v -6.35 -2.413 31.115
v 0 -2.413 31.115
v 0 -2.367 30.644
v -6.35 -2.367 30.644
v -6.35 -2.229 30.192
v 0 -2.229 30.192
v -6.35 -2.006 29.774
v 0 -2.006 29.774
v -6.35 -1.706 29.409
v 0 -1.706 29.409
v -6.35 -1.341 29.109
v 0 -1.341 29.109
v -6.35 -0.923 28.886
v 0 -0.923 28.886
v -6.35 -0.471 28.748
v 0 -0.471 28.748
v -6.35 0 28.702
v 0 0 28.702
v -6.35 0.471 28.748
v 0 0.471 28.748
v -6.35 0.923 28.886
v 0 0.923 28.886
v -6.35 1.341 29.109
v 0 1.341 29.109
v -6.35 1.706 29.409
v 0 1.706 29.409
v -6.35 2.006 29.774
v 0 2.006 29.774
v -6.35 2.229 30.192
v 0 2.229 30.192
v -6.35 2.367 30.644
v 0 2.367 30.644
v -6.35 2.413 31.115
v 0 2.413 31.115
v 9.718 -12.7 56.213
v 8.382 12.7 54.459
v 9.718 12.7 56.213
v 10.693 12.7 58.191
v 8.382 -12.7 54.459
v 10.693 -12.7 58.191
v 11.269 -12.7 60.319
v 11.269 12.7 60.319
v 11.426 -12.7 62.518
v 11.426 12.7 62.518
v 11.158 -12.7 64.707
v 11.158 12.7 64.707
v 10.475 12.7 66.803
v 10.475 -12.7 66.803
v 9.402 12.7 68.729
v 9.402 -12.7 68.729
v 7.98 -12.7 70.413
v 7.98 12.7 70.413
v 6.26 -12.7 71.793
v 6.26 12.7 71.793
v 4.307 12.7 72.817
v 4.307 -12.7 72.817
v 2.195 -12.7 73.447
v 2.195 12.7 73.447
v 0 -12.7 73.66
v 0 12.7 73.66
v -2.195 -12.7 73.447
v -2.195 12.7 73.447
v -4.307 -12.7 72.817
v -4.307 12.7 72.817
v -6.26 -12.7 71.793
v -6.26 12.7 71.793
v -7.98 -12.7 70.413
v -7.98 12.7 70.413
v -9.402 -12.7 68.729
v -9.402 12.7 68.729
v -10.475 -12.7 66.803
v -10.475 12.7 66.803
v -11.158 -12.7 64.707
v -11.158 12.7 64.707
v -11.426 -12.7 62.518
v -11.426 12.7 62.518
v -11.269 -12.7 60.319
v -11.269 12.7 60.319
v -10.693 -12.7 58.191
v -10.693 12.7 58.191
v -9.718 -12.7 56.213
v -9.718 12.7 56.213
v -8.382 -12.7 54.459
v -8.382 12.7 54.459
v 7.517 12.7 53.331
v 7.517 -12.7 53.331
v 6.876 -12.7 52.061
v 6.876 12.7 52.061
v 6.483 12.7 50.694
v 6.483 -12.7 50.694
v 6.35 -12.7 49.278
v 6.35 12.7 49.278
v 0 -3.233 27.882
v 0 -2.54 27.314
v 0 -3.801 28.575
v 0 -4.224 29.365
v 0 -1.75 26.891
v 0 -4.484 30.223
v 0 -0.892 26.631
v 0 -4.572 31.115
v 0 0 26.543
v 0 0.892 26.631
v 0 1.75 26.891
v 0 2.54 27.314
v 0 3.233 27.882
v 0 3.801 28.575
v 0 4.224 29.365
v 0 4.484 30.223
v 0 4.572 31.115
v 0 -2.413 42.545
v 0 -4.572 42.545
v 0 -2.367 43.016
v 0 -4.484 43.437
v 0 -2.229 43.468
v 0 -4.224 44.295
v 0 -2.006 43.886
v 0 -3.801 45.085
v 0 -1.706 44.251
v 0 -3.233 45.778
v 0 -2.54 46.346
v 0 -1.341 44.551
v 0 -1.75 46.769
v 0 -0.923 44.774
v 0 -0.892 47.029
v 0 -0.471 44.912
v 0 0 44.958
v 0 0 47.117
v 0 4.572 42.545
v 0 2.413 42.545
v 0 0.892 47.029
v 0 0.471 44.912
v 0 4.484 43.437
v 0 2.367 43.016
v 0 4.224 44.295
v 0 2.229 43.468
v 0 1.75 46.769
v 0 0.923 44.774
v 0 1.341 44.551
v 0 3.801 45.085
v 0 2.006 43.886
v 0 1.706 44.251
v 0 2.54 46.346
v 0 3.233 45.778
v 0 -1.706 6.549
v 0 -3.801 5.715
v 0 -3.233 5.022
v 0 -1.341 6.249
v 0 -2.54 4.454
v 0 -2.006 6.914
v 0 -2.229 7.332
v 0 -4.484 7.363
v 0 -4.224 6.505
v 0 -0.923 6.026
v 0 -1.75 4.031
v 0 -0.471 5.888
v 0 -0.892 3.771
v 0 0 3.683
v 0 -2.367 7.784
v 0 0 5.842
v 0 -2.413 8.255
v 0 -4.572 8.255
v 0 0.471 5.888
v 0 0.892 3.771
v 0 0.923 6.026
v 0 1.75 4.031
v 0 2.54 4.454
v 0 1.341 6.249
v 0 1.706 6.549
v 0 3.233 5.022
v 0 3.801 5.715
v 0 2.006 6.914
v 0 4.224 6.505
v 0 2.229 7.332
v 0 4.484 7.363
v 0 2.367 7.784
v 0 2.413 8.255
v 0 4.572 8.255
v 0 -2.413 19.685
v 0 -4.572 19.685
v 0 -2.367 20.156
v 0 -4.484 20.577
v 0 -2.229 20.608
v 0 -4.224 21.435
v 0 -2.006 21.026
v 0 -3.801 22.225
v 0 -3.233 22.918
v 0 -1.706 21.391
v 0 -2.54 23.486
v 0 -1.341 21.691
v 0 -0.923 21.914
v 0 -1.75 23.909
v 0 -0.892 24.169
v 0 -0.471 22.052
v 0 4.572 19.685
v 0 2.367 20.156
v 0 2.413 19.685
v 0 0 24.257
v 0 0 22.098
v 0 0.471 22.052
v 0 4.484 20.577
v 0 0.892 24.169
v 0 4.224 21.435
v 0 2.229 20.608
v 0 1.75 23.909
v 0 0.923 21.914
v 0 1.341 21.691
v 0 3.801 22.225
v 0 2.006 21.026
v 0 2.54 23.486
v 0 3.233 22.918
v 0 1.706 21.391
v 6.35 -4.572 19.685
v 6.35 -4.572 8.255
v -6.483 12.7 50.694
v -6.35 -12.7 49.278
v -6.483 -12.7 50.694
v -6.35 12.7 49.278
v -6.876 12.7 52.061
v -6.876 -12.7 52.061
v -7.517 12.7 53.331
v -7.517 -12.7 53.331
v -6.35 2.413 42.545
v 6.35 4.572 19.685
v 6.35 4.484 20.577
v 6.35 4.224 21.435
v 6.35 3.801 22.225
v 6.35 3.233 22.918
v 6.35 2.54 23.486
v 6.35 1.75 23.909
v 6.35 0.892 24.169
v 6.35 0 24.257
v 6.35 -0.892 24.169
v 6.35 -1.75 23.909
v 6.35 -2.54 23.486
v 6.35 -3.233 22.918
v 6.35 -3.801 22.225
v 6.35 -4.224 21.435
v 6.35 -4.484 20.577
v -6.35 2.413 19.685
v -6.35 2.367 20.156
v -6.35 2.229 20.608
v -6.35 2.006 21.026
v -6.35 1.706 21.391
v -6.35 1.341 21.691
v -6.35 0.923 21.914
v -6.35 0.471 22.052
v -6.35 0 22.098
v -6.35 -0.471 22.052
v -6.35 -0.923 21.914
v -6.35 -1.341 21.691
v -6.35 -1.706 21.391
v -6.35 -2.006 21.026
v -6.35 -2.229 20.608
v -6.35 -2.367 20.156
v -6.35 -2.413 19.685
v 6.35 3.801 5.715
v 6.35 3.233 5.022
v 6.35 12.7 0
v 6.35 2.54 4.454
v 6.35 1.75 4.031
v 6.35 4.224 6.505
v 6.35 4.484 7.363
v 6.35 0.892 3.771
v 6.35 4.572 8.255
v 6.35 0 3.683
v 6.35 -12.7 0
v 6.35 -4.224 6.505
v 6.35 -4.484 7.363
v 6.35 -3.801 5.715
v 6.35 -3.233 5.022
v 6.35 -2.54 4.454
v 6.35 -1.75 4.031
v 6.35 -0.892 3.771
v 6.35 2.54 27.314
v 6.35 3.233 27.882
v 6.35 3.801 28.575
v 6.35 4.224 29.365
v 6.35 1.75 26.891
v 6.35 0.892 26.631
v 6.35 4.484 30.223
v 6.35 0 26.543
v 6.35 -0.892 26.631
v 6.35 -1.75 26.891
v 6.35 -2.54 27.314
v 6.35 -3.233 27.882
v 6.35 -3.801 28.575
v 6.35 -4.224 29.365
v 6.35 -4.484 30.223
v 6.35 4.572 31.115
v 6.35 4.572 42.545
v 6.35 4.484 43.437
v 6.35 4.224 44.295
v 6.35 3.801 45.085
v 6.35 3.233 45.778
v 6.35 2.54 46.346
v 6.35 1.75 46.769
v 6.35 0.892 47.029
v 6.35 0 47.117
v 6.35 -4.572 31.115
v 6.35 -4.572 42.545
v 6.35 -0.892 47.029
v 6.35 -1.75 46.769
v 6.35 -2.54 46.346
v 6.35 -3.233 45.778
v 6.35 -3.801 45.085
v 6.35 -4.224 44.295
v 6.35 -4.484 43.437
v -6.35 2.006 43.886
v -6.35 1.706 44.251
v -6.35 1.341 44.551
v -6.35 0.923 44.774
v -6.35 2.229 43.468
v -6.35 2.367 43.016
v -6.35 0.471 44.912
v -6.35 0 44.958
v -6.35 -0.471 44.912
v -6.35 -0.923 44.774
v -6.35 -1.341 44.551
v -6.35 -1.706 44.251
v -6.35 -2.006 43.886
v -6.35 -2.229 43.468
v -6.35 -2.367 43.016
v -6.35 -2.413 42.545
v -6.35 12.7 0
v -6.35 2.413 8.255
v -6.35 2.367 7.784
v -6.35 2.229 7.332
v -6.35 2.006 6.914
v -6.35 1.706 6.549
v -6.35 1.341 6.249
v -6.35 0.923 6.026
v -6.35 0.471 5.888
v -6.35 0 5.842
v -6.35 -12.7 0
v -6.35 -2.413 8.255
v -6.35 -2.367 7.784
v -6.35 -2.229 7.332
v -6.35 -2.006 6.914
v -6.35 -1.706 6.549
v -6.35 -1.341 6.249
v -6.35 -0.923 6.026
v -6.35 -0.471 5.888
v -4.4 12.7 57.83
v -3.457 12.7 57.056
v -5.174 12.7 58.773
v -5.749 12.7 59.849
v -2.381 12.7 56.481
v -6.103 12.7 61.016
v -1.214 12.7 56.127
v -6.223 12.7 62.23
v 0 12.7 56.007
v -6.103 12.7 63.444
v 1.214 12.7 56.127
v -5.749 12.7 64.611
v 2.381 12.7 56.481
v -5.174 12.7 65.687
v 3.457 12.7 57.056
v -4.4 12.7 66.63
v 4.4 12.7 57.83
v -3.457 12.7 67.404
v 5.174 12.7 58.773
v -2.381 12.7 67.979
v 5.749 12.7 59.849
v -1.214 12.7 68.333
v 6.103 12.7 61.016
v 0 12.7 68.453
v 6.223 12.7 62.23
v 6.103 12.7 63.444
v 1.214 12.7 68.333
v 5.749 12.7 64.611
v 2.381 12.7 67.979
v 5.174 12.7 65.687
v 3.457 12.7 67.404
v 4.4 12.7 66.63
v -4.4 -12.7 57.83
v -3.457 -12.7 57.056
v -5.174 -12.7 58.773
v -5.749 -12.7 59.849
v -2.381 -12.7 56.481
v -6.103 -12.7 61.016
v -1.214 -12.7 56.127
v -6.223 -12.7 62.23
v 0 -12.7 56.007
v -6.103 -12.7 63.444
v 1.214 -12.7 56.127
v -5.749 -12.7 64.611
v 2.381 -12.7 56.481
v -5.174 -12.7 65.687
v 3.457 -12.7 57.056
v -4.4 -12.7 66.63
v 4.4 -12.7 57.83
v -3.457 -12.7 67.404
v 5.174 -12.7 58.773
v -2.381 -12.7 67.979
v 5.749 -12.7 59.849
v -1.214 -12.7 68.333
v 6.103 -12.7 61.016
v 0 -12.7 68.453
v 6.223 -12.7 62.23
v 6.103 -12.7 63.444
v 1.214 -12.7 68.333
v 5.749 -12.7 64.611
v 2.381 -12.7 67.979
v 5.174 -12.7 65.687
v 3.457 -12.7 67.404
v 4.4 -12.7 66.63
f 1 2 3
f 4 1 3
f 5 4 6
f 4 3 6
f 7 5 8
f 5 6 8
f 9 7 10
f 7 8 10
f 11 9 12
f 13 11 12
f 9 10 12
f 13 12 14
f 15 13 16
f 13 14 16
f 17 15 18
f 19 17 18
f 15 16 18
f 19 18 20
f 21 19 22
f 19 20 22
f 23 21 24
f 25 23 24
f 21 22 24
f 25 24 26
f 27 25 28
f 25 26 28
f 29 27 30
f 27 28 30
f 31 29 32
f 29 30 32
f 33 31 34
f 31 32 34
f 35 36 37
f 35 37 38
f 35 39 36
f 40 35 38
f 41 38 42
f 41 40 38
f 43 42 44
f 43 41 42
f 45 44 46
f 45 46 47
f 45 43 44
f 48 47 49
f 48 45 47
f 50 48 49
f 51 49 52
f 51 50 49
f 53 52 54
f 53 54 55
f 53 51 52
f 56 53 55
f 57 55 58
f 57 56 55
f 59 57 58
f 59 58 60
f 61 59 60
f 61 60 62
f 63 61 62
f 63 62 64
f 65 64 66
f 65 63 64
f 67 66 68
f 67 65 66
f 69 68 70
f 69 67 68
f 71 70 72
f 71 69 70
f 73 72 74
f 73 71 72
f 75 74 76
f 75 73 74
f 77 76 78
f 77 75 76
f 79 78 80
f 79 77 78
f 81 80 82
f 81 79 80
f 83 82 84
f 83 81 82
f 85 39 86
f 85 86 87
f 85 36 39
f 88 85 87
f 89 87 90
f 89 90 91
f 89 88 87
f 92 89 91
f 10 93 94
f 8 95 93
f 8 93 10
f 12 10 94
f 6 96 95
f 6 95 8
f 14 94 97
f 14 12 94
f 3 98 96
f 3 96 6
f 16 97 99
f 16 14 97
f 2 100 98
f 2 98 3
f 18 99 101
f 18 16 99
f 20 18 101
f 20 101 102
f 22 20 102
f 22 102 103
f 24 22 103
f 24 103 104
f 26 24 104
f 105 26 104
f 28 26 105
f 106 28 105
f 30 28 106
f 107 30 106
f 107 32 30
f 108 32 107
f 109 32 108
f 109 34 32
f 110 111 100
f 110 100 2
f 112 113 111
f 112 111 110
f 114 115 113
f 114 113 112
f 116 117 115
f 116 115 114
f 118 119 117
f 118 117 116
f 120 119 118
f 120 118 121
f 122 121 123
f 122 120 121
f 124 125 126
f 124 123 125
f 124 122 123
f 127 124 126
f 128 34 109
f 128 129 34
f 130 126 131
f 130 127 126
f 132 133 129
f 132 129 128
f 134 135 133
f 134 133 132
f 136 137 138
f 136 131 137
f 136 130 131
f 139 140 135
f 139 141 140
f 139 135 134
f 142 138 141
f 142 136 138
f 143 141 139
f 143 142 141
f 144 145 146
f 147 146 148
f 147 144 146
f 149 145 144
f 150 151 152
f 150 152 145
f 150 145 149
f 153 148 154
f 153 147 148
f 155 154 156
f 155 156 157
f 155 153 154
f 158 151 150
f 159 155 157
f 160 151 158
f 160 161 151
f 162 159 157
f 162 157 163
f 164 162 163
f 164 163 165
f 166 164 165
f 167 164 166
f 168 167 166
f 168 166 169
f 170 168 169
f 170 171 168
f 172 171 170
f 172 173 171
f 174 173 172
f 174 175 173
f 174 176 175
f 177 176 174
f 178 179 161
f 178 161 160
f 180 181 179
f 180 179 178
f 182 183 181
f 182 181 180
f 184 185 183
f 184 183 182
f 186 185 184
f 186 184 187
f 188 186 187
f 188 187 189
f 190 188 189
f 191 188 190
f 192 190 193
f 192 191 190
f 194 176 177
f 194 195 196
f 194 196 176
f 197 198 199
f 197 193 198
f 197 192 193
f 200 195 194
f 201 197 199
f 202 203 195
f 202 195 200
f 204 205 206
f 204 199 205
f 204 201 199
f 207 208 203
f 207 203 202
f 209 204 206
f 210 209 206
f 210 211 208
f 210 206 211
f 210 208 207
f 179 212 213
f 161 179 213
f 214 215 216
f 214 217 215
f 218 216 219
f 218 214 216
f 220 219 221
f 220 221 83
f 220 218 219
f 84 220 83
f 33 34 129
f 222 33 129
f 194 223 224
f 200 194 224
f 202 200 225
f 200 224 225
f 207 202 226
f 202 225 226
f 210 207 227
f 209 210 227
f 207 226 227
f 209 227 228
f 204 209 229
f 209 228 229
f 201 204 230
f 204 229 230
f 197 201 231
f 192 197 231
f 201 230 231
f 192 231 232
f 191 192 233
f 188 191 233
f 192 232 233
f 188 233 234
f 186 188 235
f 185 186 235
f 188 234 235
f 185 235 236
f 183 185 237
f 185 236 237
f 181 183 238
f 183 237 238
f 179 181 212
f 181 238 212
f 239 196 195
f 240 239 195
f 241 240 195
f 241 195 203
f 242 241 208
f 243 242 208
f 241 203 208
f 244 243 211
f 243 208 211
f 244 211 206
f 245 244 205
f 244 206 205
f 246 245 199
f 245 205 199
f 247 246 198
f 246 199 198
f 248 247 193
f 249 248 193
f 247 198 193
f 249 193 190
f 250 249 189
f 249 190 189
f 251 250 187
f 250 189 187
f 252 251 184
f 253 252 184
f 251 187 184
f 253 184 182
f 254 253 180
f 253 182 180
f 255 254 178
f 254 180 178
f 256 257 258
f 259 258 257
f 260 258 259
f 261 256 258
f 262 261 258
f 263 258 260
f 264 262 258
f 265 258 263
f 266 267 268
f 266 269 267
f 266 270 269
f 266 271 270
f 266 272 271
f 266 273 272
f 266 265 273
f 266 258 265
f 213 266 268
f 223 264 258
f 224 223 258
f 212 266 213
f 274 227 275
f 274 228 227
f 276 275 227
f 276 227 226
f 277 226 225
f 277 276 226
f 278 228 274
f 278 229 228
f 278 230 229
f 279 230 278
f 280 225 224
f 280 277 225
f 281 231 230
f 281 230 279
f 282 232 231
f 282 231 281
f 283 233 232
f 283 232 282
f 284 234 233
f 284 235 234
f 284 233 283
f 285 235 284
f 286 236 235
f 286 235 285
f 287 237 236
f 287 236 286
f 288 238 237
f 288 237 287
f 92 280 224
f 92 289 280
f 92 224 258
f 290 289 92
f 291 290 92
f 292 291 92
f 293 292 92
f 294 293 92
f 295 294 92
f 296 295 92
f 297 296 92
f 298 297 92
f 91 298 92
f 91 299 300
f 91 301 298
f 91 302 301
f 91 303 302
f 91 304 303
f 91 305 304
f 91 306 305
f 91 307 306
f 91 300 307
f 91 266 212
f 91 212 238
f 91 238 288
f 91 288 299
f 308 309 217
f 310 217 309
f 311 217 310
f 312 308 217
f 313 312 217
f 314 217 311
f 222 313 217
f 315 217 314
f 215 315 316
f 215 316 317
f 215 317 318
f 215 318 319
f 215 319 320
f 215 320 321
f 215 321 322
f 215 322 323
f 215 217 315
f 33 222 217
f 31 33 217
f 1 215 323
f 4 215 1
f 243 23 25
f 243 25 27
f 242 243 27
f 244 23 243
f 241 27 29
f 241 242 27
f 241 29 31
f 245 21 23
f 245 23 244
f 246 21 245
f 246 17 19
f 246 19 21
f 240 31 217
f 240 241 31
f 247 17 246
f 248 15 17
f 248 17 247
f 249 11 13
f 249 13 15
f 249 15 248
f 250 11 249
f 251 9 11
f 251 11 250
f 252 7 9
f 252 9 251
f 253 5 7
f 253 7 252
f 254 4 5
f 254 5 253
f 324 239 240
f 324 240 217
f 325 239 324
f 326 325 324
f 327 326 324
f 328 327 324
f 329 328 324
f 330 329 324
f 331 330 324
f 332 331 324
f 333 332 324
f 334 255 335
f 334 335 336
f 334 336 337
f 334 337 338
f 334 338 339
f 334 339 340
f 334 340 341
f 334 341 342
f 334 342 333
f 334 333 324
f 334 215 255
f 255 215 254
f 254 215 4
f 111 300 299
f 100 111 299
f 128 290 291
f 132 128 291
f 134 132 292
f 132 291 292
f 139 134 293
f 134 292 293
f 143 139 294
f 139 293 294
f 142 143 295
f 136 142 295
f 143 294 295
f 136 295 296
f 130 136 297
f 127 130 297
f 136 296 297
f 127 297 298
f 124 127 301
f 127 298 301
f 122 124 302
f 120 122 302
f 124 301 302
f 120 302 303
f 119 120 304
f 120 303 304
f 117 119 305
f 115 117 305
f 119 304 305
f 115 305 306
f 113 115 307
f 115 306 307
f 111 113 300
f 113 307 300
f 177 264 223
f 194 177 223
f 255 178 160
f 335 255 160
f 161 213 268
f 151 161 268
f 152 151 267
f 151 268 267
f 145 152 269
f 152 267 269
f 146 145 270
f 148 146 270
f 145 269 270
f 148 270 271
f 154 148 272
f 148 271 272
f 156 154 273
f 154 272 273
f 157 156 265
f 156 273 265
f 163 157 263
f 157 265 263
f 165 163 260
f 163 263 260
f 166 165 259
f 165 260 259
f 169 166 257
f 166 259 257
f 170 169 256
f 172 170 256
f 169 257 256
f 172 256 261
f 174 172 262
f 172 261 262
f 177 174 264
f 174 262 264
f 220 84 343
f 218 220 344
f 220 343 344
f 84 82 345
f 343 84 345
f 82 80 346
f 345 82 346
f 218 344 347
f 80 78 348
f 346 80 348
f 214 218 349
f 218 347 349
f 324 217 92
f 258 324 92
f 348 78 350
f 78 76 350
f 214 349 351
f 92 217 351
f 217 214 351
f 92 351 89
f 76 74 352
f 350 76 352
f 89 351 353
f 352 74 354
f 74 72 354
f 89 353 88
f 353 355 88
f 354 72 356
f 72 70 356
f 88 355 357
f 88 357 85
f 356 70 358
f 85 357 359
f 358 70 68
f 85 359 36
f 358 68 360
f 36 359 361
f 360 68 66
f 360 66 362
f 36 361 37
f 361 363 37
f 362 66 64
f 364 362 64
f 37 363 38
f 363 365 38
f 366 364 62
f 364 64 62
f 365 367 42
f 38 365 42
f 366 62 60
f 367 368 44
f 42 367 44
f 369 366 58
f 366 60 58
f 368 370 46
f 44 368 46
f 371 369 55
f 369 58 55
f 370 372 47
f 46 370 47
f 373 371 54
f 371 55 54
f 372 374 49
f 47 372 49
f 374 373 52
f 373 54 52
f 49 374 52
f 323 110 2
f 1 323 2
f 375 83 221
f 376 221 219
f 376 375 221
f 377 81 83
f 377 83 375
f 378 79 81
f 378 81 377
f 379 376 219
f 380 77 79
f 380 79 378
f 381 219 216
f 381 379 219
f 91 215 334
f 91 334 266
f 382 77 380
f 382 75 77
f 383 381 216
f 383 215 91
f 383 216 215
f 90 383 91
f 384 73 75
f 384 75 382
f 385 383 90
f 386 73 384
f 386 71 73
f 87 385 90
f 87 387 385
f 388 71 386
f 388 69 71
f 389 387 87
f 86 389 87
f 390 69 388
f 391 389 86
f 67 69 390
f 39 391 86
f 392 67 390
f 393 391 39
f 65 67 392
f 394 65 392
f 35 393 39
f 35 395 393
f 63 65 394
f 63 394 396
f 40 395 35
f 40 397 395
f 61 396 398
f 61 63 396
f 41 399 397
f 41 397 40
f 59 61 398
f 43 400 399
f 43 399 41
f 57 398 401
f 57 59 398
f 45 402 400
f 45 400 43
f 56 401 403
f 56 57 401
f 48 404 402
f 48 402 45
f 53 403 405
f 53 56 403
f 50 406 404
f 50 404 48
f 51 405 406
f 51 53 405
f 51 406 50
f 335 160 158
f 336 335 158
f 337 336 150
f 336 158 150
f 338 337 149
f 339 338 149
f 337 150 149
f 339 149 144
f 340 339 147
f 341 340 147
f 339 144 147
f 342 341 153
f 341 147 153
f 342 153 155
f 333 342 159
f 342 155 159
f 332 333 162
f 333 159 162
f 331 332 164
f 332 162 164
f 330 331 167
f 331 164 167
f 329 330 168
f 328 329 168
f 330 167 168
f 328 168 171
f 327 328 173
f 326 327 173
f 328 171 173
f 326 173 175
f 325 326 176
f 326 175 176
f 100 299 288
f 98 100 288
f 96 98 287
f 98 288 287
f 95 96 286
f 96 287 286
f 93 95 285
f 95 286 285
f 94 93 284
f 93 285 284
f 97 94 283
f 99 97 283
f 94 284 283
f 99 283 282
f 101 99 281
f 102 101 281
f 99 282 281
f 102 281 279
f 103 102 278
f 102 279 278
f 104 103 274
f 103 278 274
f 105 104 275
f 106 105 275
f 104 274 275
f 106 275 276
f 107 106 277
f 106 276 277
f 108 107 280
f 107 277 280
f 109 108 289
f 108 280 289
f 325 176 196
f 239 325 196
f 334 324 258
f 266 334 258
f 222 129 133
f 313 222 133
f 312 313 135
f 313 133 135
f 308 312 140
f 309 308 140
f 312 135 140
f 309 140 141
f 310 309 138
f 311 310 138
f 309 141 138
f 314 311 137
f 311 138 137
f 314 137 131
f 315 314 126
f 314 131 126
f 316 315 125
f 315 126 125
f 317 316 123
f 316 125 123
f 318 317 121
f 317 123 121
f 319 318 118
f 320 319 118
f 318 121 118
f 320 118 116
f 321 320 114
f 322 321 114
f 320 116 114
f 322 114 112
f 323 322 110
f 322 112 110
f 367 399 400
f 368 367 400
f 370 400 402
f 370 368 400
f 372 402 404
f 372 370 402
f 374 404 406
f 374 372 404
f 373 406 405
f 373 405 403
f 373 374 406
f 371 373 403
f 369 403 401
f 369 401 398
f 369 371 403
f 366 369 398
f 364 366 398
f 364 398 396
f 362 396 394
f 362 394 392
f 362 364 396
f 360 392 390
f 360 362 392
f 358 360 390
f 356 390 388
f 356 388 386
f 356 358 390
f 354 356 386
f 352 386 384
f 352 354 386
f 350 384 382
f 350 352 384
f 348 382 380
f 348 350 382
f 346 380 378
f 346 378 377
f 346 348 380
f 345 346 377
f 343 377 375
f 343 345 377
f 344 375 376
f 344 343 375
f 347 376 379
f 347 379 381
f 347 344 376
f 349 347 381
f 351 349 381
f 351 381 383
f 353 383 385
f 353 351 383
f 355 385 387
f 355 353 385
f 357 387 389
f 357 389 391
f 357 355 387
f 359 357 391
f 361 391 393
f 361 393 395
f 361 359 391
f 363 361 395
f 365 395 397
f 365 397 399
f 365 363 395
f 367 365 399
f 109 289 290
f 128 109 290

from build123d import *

# Parameters (mm, degrees)
F0_R          = 6.223
F1_DEPTH      = 12.7
F3_R          = 7.62
F2_R          = 2.413
F4_DEPTH      = 17.781
F6_DEPTH      = 17.781
F8_DEPTH      = 6.35
F8_DEPTH_BACK = 5.081


with BuildPart() as f1:
    # F0 (on Front) → F1 (new body, symmetric)
    with BuildSketch(Plane.XZ):
        with BuildLine():
            Line((-6.35, 52.7261902376), (-6.35, 0))
            Line((-6.35, 0), (6.35, 0))
            Line((6.35, 0), (6.35, 52.7261902376))
            ThreePointArc((6.35, 52.7261902376), (0, 73.66), (-6.35, 52.7261902376))
        make_face()
        with Locations((0, 62.23)):
            Circle(F0_R, mode=Mode.SUBTRACT)
    extrude(amount=F1_DEPTH, both=True)

    # F3
    f3_edges = [f1.edges().sort_by_distance(p)[0] for p in [
        (-6.35, 0, 52.72619),
        (6.35, 0, 52.72619),
    ]]
    fillet(f3_edges, radius=F3_R)

    # F2 (on face) → F4 (cut, through all)
    with BuildSketch(Plane.YZ.offset(6.35)):
        with Locations((0, 36.83)):
            Circle(F2_R)
        with Locations((0, 13.97)):
            Circle(F2_R)
    extrude(amount=-F4_DEPTH, mode=Mode.SUBTRACT)

    # F5 (on face) → F6 (cut, through all)
    with BuildSketch(Plane.YZ.offset(6.35)):
        with BuildLine():
            ThreePointArc((2.413, 42.545), (0, 44.958), (-2.413, 42.545))
            Line((-2.413, 42.545), (-2.413, 31.115))
            ThreePointArc((-2.413, 31.115), (0, 28.702), (2.413, 31.115))
            Line((2.413, 31.115), (2.413, 42.545))
        make_face()
        with BuildLine():
            ThreePointArc((2.413, 19.685), (0, 22.098), (-2.413, 19.685))
            Line((-2.413, 19.685), (-2.413, 8.255))
            ThreePointArc((-2.413, 8.255), (0, 5.842), (2.413, 8.255))
            Line((2.413, 8.255), (2.413, 19.685))
        make_face()
    extrude(amount=-F6_DEPTH, mode=Mode.SUBTRACT)

    # F7 (on face) → F8 (cut, two sides)
    with BuildSketch(Plane.YZ.offset(6.35)) as f8_sk:
        with BuildLine():
            Line((4.572, 31.115), (4.572, 42.545))
            ThreePointArc((4.572, 42.545), (0, 47.117), (-4.572, 42.545))
            Line((-4.572, 42.545), (-4.572, 31.115))
            ThreePointArc((-4.572, 31.115), (0, 26.543), (4.572, 31.115))
        make_face()
        with BuildLine():
            Line((4.572, 8.255), (4.572, 19.685))
            ThreePointArc((4.572, 19.685), (0, 24.257), (-4.572, 19.685))
            Line((-4.572, 19.685), (-4.572, 8.255))
            ThreePointArc((-4.572, 8.255), (0, 3.683), (4.572, 8.255))
        make_face()
    extrude(amount=-F8_DEPTH, mode=Mode.SUBTRACT)
    extrude(f8_sk.sketch, amount=F8_DEPTH_BACK, mode=Mode.SUBTRACT)


solid = f1.part
